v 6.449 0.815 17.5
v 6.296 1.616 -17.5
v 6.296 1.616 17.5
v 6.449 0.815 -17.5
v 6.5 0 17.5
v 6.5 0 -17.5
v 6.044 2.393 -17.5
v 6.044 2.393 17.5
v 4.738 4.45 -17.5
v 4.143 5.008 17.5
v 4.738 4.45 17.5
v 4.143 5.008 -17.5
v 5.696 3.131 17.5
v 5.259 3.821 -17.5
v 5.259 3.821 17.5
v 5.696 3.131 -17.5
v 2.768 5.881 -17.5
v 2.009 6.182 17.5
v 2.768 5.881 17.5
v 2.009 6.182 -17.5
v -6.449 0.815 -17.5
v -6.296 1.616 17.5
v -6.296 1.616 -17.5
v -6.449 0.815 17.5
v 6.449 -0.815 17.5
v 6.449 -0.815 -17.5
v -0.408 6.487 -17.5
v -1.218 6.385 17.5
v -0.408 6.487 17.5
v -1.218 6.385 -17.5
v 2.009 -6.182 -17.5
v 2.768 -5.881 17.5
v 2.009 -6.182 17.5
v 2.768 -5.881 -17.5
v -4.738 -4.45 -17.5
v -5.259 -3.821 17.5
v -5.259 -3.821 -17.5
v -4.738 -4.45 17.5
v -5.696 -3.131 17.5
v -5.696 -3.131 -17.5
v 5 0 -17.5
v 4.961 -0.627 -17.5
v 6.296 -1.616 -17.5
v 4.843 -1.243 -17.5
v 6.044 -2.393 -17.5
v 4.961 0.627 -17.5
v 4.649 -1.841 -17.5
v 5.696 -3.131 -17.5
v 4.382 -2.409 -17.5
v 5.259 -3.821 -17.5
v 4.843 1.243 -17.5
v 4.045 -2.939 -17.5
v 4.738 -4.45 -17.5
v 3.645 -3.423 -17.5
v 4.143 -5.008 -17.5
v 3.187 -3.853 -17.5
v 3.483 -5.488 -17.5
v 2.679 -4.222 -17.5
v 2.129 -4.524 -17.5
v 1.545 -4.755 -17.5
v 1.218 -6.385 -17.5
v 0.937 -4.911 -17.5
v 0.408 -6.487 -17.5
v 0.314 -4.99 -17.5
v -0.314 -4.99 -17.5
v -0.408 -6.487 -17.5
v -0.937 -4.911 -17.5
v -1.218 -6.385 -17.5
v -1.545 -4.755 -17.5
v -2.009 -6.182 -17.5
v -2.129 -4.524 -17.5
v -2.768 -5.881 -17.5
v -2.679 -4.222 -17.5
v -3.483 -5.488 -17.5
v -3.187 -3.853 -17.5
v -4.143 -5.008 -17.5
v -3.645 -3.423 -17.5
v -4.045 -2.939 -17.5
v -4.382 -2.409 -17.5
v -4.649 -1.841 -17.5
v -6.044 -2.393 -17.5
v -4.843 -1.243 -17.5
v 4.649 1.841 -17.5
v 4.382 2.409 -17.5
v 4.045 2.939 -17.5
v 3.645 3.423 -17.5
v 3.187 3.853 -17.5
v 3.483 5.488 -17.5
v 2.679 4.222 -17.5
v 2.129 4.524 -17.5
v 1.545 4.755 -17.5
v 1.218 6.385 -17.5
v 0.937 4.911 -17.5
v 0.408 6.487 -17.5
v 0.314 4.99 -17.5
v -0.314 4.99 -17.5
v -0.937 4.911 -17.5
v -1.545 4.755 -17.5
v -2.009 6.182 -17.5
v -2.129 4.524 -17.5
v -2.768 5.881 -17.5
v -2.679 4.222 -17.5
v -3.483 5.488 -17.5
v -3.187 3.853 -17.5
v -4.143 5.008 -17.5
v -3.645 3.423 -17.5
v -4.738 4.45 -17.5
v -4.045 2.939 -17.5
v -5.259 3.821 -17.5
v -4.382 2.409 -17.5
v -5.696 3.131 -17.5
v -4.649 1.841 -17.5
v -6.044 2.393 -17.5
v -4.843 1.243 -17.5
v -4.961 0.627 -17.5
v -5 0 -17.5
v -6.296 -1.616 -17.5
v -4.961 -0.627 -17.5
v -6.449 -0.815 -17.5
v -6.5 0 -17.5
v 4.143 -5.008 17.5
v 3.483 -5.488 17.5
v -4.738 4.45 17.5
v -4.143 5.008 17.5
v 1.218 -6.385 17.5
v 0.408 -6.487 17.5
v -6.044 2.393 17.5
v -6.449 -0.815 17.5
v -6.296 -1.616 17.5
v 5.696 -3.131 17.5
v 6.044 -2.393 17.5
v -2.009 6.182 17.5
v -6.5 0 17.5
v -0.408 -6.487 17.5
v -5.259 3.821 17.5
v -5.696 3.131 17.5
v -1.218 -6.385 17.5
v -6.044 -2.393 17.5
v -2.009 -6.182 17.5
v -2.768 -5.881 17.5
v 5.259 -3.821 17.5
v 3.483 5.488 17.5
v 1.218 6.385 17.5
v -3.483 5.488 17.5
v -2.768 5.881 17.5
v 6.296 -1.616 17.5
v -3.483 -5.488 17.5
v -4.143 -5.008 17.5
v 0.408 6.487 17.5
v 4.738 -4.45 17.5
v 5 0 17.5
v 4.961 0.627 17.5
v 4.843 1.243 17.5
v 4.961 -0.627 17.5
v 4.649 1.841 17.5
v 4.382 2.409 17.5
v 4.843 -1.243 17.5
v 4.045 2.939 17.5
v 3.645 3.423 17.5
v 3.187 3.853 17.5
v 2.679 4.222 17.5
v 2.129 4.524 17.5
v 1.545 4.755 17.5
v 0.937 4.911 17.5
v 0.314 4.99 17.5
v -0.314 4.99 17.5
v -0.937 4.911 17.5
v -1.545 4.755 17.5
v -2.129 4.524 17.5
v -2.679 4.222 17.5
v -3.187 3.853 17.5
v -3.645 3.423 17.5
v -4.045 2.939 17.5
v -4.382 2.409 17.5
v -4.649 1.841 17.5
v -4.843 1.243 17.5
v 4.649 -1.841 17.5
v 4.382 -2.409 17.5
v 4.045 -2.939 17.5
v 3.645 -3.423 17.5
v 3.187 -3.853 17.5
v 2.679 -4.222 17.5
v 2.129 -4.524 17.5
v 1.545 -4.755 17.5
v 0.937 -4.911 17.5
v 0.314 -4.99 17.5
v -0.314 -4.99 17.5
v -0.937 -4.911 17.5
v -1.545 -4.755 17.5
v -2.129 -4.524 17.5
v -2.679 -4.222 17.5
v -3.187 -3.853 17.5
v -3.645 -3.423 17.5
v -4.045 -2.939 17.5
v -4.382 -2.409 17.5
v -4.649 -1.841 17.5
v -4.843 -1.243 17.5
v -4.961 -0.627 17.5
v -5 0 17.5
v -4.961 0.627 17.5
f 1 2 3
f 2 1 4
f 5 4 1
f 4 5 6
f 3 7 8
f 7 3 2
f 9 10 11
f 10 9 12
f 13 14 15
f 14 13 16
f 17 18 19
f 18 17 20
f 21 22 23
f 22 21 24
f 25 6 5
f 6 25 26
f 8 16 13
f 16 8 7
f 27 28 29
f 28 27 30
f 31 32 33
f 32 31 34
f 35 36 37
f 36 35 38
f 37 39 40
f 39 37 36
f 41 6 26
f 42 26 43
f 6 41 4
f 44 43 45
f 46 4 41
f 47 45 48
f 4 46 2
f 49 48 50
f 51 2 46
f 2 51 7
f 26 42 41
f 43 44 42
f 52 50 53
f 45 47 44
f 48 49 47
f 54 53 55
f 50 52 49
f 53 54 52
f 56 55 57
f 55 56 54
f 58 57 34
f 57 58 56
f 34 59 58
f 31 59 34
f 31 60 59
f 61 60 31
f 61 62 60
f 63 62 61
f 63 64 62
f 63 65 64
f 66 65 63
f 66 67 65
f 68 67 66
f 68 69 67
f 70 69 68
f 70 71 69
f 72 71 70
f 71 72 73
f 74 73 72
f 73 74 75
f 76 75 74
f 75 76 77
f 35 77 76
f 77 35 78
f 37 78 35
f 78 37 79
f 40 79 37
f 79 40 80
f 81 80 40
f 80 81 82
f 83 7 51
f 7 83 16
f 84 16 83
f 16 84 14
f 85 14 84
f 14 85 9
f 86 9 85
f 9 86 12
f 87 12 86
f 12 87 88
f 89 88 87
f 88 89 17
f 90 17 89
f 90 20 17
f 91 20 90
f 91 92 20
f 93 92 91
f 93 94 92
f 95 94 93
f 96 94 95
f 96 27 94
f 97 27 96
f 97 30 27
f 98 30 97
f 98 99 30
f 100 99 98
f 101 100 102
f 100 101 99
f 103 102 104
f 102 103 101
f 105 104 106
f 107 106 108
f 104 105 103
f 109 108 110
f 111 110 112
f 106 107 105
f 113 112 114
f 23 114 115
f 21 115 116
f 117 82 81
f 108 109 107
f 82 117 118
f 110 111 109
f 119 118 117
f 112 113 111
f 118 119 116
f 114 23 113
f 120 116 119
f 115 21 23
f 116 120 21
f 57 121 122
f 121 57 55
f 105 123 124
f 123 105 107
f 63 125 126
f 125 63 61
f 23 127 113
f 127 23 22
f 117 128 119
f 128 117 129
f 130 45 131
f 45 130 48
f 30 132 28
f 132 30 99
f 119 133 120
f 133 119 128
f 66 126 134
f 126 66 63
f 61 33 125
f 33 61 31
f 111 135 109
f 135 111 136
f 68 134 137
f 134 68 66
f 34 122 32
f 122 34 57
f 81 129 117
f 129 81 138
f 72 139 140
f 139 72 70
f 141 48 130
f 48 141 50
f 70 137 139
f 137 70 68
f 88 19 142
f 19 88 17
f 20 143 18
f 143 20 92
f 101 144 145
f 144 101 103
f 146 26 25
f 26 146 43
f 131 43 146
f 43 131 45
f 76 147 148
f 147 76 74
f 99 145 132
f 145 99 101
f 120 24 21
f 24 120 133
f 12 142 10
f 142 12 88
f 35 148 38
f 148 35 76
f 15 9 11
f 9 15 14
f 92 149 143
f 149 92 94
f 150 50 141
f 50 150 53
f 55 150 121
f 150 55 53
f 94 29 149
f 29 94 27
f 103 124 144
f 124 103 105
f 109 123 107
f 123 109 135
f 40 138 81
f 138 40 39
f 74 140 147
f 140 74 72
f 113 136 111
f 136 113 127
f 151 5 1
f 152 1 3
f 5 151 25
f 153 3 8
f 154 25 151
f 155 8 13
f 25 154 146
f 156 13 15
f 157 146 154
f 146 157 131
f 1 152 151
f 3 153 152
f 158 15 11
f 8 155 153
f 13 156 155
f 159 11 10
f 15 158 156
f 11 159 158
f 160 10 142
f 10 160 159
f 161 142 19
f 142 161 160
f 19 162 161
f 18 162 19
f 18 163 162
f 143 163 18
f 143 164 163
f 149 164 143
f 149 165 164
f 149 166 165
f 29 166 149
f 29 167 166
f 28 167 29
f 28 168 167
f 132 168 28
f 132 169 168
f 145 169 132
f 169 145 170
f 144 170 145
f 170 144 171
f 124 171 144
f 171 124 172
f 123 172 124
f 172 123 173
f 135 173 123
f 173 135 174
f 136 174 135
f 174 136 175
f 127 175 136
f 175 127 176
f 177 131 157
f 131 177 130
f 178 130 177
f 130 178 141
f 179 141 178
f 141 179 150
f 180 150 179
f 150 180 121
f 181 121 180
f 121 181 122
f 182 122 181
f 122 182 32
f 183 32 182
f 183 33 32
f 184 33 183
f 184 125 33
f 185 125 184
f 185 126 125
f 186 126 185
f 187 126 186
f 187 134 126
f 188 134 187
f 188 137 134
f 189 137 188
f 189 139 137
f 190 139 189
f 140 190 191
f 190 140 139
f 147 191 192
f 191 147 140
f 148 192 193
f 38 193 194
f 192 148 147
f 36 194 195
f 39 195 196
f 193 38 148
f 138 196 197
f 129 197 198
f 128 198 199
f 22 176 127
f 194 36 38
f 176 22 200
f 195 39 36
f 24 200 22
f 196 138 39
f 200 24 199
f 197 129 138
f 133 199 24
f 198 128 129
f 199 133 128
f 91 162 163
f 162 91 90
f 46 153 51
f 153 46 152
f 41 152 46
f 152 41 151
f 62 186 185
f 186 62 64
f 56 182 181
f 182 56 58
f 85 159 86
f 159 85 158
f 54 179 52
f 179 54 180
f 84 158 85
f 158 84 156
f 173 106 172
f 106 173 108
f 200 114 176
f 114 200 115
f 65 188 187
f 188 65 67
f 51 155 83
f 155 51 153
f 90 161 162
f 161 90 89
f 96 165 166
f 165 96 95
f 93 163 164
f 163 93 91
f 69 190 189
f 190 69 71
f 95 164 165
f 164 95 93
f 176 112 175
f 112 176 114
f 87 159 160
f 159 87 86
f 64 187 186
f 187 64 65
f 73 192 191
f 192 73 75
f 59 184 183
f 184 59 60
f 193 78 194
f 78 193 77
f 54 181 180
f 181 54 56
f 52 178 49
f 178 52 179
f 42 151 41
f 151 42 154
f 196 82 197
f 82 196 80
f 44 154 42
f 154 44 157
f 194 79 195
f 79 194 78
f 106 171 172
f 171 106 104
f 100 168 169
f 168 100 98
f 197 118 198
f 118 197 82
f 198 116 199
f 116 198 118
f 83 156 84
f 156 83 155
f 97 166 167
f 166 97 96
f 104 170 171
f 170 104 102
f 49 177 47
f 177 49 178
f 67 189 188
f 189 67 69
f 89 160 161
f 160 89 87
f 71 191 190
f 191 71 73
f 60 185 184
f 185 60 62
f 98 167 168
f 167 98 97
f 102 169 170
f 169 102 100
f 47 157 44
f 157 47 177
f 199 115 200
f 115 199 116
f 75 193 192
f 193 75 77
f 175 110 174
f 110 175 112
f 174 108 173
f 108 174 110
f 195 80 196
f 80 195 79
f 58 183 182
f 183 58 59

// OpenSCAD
$fn = 50;


difference() {
	union() {
		translate(v = [0, 0, -17.5000000000]) {
			cylinder(h = 35, r = 6.5000000000);
		}
	}
	union() {
		translate(v = [0, 0, -100.0000000000]) {
			cylinder(h = 200, r = 5.0000000000);
		}
	}
}
